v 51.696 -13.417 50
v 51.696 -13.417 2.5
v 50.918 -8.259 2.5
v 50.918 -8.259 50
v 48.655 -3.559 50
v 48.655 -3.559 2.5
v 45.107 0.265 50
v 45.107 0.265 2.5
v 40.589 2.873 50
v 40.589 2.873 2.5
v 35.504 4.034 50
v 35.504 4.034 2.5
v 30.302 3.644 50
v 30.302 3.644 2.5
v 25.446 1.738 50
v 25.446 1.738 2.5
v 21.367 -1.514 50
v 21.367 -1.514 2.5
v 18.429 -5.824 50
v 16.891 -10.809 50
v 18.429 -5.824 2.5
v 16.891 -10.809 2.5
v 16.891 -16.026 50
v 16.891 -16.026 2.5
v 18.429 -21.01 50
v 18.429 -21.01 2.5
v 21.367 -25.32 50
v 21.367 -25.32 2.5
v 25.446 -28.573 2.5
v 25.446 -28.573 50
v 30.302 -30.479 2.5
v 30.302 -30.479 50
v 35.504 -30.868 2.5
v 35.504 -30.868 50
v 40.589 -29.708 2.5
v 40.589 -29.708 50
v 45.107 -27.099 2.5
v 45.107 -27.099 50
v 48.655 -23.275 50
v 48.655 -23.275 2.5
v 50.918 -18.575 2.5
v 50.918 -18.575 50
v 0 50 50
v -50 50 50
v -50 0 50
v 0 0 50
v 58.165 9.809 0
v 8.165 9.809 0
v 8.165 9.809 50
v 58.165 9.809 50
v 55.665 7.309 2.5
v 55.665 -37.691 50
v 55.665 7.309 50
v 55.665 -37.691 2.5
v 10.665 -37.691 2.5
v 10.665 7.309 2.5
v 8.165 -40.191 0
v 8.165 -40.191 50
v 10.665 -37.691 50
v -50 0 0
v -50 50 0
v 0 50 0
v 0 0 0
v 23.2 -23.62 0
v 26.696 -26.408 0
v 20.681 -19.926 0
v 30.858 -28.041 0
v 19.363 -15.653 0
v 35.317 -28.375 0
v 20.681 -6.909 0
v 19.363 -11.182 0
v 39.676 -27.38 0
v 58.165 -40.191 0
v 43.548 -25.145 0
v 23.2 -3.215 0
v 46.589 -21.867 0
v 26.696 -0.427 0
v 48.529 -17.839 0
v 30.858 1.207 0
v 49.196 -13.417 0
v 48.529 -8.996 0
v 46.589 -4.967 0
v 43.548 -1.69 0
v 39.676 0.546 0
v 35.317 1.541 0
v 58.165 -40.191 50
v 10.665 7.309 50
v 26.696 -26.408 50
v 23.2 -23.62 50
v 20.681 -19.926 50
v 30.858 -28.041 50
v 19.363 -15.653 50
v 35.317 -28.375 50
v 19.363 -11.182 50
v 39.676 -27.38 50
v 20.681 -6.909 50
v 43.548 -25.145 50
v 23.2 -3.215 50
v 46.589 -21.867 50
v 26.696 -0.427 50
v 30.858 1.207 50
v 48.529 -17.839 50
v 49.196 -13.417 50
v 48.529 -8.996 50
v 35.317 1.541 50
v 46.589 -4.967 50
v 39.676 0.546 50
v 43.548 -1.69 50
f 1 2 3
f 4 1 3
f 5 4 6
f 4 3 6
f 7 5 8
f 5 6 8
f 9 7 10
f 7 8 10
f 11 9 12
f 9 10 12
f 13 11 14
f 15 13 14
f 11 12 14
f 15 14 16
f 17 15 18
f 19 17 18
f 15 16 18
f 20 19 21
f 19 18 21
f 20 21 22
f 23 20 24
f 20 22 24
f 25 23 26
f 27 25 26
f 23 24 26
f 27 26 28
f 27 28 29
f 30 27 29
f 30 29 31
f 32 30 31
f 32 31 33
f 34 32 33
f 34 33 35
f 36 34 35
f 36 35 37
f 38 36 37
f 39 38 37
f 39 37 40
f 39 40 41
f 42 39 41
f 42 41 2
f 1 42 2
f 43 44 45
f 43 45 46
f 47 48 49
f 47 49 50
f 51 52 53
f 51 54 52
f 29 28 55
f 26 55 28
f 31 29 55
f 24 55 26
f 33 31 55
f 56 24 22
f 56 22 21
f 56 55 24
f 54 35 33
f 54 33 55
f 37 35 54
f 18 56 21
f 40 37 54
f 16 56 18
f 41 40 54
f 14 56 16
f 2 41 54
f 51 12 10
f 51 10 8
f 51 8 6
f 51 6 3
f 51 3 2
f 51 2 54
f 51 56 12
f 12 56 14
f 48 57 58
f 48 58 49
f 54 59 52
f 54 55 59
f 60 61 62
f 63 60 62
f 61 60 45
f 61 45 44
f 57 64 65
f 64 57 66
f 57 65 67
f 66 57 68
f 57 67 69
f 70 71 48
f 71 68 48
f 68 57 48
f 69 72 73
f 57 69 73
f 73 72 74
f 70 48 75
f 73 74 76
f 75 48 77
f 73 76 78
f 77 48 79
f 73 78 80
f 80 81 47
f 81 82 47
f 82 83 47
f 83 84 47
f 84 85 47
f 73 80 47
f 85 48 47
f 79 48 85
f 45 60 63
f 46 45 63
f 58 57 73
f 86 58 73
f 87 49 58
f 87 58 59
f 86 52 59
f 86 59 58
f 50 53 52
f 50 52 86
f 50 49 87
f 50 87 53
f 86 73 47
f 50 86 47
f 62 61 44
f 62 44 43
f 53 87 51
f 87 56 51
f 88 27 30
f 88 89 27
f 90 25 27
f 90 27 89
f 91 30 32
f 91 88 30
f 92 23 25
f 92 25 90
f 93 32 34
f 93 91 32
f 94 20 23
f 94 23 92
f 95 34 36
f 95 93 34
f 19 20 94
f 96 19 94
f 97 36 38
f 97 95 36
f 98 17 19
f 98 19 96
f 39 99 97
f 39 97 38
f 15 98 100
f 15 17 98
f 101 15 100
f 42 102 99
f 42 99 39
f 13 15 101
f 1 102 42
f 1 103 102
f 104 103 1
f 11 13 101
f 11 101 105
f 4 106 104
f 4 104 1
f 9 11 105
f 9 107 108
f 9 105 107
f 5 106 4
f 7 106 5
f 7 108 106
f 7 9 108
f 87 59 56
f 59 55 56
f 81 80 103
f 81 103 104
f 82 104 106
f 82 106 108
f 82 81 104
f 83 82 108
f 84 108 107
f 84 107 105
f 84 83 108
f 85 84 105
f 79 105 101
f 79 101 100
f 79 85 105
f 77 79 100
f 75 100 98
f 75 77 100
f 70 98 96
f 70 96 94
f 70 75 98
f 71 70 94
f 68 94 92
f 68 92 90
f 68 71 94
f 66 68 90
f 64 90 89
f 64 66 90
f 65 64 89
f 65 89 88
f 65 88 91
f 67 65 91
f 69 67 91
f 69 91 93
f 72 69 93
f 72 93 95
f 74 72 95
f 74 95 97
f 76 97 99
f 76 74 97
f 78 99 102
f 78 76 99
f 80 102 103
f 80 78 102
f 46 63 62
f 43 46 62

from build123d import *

# Parameters (mm, degrees)
F0_W     = 50
F0_H     = 50
F1_DEPTH = 50
F2_W     = 50
F2_H     = 50
F2_R     = 15
F3_DEPTH = 50
F4_T     = -2.5


with BuildPart() as f1:
    # F0 (on Top) → F1 (new body)
    with BuildSketch(Plane.XY):
        with Locations((-25, 25)):
            Rectangle(F0_W, F0_H)
    extrude(amount=F1_DEPTH)


with BuildPart() as f3:
    # F2 (on Top) → F3 (new body)
    with BuildSketch(Plane.XY):
        with Locations((33.165371, -15.190946)):
            Rectangle(F2_W, F2_H)
        with Locations((34.195889, -13.417262)):
            Circle(F2_R, mode=Mode.SUBTRACT)
    extrude(amount=F3_DEPTH)

    # F4
    f4_openings = [f3.faces().sort_by_distance(p)[0] for p in [
        (8.872477, -15.190946, 50),
    ]]
    offset(amount=F4_T, openings=f4_openings)


solid = Compound([f1.part, f3.part])
